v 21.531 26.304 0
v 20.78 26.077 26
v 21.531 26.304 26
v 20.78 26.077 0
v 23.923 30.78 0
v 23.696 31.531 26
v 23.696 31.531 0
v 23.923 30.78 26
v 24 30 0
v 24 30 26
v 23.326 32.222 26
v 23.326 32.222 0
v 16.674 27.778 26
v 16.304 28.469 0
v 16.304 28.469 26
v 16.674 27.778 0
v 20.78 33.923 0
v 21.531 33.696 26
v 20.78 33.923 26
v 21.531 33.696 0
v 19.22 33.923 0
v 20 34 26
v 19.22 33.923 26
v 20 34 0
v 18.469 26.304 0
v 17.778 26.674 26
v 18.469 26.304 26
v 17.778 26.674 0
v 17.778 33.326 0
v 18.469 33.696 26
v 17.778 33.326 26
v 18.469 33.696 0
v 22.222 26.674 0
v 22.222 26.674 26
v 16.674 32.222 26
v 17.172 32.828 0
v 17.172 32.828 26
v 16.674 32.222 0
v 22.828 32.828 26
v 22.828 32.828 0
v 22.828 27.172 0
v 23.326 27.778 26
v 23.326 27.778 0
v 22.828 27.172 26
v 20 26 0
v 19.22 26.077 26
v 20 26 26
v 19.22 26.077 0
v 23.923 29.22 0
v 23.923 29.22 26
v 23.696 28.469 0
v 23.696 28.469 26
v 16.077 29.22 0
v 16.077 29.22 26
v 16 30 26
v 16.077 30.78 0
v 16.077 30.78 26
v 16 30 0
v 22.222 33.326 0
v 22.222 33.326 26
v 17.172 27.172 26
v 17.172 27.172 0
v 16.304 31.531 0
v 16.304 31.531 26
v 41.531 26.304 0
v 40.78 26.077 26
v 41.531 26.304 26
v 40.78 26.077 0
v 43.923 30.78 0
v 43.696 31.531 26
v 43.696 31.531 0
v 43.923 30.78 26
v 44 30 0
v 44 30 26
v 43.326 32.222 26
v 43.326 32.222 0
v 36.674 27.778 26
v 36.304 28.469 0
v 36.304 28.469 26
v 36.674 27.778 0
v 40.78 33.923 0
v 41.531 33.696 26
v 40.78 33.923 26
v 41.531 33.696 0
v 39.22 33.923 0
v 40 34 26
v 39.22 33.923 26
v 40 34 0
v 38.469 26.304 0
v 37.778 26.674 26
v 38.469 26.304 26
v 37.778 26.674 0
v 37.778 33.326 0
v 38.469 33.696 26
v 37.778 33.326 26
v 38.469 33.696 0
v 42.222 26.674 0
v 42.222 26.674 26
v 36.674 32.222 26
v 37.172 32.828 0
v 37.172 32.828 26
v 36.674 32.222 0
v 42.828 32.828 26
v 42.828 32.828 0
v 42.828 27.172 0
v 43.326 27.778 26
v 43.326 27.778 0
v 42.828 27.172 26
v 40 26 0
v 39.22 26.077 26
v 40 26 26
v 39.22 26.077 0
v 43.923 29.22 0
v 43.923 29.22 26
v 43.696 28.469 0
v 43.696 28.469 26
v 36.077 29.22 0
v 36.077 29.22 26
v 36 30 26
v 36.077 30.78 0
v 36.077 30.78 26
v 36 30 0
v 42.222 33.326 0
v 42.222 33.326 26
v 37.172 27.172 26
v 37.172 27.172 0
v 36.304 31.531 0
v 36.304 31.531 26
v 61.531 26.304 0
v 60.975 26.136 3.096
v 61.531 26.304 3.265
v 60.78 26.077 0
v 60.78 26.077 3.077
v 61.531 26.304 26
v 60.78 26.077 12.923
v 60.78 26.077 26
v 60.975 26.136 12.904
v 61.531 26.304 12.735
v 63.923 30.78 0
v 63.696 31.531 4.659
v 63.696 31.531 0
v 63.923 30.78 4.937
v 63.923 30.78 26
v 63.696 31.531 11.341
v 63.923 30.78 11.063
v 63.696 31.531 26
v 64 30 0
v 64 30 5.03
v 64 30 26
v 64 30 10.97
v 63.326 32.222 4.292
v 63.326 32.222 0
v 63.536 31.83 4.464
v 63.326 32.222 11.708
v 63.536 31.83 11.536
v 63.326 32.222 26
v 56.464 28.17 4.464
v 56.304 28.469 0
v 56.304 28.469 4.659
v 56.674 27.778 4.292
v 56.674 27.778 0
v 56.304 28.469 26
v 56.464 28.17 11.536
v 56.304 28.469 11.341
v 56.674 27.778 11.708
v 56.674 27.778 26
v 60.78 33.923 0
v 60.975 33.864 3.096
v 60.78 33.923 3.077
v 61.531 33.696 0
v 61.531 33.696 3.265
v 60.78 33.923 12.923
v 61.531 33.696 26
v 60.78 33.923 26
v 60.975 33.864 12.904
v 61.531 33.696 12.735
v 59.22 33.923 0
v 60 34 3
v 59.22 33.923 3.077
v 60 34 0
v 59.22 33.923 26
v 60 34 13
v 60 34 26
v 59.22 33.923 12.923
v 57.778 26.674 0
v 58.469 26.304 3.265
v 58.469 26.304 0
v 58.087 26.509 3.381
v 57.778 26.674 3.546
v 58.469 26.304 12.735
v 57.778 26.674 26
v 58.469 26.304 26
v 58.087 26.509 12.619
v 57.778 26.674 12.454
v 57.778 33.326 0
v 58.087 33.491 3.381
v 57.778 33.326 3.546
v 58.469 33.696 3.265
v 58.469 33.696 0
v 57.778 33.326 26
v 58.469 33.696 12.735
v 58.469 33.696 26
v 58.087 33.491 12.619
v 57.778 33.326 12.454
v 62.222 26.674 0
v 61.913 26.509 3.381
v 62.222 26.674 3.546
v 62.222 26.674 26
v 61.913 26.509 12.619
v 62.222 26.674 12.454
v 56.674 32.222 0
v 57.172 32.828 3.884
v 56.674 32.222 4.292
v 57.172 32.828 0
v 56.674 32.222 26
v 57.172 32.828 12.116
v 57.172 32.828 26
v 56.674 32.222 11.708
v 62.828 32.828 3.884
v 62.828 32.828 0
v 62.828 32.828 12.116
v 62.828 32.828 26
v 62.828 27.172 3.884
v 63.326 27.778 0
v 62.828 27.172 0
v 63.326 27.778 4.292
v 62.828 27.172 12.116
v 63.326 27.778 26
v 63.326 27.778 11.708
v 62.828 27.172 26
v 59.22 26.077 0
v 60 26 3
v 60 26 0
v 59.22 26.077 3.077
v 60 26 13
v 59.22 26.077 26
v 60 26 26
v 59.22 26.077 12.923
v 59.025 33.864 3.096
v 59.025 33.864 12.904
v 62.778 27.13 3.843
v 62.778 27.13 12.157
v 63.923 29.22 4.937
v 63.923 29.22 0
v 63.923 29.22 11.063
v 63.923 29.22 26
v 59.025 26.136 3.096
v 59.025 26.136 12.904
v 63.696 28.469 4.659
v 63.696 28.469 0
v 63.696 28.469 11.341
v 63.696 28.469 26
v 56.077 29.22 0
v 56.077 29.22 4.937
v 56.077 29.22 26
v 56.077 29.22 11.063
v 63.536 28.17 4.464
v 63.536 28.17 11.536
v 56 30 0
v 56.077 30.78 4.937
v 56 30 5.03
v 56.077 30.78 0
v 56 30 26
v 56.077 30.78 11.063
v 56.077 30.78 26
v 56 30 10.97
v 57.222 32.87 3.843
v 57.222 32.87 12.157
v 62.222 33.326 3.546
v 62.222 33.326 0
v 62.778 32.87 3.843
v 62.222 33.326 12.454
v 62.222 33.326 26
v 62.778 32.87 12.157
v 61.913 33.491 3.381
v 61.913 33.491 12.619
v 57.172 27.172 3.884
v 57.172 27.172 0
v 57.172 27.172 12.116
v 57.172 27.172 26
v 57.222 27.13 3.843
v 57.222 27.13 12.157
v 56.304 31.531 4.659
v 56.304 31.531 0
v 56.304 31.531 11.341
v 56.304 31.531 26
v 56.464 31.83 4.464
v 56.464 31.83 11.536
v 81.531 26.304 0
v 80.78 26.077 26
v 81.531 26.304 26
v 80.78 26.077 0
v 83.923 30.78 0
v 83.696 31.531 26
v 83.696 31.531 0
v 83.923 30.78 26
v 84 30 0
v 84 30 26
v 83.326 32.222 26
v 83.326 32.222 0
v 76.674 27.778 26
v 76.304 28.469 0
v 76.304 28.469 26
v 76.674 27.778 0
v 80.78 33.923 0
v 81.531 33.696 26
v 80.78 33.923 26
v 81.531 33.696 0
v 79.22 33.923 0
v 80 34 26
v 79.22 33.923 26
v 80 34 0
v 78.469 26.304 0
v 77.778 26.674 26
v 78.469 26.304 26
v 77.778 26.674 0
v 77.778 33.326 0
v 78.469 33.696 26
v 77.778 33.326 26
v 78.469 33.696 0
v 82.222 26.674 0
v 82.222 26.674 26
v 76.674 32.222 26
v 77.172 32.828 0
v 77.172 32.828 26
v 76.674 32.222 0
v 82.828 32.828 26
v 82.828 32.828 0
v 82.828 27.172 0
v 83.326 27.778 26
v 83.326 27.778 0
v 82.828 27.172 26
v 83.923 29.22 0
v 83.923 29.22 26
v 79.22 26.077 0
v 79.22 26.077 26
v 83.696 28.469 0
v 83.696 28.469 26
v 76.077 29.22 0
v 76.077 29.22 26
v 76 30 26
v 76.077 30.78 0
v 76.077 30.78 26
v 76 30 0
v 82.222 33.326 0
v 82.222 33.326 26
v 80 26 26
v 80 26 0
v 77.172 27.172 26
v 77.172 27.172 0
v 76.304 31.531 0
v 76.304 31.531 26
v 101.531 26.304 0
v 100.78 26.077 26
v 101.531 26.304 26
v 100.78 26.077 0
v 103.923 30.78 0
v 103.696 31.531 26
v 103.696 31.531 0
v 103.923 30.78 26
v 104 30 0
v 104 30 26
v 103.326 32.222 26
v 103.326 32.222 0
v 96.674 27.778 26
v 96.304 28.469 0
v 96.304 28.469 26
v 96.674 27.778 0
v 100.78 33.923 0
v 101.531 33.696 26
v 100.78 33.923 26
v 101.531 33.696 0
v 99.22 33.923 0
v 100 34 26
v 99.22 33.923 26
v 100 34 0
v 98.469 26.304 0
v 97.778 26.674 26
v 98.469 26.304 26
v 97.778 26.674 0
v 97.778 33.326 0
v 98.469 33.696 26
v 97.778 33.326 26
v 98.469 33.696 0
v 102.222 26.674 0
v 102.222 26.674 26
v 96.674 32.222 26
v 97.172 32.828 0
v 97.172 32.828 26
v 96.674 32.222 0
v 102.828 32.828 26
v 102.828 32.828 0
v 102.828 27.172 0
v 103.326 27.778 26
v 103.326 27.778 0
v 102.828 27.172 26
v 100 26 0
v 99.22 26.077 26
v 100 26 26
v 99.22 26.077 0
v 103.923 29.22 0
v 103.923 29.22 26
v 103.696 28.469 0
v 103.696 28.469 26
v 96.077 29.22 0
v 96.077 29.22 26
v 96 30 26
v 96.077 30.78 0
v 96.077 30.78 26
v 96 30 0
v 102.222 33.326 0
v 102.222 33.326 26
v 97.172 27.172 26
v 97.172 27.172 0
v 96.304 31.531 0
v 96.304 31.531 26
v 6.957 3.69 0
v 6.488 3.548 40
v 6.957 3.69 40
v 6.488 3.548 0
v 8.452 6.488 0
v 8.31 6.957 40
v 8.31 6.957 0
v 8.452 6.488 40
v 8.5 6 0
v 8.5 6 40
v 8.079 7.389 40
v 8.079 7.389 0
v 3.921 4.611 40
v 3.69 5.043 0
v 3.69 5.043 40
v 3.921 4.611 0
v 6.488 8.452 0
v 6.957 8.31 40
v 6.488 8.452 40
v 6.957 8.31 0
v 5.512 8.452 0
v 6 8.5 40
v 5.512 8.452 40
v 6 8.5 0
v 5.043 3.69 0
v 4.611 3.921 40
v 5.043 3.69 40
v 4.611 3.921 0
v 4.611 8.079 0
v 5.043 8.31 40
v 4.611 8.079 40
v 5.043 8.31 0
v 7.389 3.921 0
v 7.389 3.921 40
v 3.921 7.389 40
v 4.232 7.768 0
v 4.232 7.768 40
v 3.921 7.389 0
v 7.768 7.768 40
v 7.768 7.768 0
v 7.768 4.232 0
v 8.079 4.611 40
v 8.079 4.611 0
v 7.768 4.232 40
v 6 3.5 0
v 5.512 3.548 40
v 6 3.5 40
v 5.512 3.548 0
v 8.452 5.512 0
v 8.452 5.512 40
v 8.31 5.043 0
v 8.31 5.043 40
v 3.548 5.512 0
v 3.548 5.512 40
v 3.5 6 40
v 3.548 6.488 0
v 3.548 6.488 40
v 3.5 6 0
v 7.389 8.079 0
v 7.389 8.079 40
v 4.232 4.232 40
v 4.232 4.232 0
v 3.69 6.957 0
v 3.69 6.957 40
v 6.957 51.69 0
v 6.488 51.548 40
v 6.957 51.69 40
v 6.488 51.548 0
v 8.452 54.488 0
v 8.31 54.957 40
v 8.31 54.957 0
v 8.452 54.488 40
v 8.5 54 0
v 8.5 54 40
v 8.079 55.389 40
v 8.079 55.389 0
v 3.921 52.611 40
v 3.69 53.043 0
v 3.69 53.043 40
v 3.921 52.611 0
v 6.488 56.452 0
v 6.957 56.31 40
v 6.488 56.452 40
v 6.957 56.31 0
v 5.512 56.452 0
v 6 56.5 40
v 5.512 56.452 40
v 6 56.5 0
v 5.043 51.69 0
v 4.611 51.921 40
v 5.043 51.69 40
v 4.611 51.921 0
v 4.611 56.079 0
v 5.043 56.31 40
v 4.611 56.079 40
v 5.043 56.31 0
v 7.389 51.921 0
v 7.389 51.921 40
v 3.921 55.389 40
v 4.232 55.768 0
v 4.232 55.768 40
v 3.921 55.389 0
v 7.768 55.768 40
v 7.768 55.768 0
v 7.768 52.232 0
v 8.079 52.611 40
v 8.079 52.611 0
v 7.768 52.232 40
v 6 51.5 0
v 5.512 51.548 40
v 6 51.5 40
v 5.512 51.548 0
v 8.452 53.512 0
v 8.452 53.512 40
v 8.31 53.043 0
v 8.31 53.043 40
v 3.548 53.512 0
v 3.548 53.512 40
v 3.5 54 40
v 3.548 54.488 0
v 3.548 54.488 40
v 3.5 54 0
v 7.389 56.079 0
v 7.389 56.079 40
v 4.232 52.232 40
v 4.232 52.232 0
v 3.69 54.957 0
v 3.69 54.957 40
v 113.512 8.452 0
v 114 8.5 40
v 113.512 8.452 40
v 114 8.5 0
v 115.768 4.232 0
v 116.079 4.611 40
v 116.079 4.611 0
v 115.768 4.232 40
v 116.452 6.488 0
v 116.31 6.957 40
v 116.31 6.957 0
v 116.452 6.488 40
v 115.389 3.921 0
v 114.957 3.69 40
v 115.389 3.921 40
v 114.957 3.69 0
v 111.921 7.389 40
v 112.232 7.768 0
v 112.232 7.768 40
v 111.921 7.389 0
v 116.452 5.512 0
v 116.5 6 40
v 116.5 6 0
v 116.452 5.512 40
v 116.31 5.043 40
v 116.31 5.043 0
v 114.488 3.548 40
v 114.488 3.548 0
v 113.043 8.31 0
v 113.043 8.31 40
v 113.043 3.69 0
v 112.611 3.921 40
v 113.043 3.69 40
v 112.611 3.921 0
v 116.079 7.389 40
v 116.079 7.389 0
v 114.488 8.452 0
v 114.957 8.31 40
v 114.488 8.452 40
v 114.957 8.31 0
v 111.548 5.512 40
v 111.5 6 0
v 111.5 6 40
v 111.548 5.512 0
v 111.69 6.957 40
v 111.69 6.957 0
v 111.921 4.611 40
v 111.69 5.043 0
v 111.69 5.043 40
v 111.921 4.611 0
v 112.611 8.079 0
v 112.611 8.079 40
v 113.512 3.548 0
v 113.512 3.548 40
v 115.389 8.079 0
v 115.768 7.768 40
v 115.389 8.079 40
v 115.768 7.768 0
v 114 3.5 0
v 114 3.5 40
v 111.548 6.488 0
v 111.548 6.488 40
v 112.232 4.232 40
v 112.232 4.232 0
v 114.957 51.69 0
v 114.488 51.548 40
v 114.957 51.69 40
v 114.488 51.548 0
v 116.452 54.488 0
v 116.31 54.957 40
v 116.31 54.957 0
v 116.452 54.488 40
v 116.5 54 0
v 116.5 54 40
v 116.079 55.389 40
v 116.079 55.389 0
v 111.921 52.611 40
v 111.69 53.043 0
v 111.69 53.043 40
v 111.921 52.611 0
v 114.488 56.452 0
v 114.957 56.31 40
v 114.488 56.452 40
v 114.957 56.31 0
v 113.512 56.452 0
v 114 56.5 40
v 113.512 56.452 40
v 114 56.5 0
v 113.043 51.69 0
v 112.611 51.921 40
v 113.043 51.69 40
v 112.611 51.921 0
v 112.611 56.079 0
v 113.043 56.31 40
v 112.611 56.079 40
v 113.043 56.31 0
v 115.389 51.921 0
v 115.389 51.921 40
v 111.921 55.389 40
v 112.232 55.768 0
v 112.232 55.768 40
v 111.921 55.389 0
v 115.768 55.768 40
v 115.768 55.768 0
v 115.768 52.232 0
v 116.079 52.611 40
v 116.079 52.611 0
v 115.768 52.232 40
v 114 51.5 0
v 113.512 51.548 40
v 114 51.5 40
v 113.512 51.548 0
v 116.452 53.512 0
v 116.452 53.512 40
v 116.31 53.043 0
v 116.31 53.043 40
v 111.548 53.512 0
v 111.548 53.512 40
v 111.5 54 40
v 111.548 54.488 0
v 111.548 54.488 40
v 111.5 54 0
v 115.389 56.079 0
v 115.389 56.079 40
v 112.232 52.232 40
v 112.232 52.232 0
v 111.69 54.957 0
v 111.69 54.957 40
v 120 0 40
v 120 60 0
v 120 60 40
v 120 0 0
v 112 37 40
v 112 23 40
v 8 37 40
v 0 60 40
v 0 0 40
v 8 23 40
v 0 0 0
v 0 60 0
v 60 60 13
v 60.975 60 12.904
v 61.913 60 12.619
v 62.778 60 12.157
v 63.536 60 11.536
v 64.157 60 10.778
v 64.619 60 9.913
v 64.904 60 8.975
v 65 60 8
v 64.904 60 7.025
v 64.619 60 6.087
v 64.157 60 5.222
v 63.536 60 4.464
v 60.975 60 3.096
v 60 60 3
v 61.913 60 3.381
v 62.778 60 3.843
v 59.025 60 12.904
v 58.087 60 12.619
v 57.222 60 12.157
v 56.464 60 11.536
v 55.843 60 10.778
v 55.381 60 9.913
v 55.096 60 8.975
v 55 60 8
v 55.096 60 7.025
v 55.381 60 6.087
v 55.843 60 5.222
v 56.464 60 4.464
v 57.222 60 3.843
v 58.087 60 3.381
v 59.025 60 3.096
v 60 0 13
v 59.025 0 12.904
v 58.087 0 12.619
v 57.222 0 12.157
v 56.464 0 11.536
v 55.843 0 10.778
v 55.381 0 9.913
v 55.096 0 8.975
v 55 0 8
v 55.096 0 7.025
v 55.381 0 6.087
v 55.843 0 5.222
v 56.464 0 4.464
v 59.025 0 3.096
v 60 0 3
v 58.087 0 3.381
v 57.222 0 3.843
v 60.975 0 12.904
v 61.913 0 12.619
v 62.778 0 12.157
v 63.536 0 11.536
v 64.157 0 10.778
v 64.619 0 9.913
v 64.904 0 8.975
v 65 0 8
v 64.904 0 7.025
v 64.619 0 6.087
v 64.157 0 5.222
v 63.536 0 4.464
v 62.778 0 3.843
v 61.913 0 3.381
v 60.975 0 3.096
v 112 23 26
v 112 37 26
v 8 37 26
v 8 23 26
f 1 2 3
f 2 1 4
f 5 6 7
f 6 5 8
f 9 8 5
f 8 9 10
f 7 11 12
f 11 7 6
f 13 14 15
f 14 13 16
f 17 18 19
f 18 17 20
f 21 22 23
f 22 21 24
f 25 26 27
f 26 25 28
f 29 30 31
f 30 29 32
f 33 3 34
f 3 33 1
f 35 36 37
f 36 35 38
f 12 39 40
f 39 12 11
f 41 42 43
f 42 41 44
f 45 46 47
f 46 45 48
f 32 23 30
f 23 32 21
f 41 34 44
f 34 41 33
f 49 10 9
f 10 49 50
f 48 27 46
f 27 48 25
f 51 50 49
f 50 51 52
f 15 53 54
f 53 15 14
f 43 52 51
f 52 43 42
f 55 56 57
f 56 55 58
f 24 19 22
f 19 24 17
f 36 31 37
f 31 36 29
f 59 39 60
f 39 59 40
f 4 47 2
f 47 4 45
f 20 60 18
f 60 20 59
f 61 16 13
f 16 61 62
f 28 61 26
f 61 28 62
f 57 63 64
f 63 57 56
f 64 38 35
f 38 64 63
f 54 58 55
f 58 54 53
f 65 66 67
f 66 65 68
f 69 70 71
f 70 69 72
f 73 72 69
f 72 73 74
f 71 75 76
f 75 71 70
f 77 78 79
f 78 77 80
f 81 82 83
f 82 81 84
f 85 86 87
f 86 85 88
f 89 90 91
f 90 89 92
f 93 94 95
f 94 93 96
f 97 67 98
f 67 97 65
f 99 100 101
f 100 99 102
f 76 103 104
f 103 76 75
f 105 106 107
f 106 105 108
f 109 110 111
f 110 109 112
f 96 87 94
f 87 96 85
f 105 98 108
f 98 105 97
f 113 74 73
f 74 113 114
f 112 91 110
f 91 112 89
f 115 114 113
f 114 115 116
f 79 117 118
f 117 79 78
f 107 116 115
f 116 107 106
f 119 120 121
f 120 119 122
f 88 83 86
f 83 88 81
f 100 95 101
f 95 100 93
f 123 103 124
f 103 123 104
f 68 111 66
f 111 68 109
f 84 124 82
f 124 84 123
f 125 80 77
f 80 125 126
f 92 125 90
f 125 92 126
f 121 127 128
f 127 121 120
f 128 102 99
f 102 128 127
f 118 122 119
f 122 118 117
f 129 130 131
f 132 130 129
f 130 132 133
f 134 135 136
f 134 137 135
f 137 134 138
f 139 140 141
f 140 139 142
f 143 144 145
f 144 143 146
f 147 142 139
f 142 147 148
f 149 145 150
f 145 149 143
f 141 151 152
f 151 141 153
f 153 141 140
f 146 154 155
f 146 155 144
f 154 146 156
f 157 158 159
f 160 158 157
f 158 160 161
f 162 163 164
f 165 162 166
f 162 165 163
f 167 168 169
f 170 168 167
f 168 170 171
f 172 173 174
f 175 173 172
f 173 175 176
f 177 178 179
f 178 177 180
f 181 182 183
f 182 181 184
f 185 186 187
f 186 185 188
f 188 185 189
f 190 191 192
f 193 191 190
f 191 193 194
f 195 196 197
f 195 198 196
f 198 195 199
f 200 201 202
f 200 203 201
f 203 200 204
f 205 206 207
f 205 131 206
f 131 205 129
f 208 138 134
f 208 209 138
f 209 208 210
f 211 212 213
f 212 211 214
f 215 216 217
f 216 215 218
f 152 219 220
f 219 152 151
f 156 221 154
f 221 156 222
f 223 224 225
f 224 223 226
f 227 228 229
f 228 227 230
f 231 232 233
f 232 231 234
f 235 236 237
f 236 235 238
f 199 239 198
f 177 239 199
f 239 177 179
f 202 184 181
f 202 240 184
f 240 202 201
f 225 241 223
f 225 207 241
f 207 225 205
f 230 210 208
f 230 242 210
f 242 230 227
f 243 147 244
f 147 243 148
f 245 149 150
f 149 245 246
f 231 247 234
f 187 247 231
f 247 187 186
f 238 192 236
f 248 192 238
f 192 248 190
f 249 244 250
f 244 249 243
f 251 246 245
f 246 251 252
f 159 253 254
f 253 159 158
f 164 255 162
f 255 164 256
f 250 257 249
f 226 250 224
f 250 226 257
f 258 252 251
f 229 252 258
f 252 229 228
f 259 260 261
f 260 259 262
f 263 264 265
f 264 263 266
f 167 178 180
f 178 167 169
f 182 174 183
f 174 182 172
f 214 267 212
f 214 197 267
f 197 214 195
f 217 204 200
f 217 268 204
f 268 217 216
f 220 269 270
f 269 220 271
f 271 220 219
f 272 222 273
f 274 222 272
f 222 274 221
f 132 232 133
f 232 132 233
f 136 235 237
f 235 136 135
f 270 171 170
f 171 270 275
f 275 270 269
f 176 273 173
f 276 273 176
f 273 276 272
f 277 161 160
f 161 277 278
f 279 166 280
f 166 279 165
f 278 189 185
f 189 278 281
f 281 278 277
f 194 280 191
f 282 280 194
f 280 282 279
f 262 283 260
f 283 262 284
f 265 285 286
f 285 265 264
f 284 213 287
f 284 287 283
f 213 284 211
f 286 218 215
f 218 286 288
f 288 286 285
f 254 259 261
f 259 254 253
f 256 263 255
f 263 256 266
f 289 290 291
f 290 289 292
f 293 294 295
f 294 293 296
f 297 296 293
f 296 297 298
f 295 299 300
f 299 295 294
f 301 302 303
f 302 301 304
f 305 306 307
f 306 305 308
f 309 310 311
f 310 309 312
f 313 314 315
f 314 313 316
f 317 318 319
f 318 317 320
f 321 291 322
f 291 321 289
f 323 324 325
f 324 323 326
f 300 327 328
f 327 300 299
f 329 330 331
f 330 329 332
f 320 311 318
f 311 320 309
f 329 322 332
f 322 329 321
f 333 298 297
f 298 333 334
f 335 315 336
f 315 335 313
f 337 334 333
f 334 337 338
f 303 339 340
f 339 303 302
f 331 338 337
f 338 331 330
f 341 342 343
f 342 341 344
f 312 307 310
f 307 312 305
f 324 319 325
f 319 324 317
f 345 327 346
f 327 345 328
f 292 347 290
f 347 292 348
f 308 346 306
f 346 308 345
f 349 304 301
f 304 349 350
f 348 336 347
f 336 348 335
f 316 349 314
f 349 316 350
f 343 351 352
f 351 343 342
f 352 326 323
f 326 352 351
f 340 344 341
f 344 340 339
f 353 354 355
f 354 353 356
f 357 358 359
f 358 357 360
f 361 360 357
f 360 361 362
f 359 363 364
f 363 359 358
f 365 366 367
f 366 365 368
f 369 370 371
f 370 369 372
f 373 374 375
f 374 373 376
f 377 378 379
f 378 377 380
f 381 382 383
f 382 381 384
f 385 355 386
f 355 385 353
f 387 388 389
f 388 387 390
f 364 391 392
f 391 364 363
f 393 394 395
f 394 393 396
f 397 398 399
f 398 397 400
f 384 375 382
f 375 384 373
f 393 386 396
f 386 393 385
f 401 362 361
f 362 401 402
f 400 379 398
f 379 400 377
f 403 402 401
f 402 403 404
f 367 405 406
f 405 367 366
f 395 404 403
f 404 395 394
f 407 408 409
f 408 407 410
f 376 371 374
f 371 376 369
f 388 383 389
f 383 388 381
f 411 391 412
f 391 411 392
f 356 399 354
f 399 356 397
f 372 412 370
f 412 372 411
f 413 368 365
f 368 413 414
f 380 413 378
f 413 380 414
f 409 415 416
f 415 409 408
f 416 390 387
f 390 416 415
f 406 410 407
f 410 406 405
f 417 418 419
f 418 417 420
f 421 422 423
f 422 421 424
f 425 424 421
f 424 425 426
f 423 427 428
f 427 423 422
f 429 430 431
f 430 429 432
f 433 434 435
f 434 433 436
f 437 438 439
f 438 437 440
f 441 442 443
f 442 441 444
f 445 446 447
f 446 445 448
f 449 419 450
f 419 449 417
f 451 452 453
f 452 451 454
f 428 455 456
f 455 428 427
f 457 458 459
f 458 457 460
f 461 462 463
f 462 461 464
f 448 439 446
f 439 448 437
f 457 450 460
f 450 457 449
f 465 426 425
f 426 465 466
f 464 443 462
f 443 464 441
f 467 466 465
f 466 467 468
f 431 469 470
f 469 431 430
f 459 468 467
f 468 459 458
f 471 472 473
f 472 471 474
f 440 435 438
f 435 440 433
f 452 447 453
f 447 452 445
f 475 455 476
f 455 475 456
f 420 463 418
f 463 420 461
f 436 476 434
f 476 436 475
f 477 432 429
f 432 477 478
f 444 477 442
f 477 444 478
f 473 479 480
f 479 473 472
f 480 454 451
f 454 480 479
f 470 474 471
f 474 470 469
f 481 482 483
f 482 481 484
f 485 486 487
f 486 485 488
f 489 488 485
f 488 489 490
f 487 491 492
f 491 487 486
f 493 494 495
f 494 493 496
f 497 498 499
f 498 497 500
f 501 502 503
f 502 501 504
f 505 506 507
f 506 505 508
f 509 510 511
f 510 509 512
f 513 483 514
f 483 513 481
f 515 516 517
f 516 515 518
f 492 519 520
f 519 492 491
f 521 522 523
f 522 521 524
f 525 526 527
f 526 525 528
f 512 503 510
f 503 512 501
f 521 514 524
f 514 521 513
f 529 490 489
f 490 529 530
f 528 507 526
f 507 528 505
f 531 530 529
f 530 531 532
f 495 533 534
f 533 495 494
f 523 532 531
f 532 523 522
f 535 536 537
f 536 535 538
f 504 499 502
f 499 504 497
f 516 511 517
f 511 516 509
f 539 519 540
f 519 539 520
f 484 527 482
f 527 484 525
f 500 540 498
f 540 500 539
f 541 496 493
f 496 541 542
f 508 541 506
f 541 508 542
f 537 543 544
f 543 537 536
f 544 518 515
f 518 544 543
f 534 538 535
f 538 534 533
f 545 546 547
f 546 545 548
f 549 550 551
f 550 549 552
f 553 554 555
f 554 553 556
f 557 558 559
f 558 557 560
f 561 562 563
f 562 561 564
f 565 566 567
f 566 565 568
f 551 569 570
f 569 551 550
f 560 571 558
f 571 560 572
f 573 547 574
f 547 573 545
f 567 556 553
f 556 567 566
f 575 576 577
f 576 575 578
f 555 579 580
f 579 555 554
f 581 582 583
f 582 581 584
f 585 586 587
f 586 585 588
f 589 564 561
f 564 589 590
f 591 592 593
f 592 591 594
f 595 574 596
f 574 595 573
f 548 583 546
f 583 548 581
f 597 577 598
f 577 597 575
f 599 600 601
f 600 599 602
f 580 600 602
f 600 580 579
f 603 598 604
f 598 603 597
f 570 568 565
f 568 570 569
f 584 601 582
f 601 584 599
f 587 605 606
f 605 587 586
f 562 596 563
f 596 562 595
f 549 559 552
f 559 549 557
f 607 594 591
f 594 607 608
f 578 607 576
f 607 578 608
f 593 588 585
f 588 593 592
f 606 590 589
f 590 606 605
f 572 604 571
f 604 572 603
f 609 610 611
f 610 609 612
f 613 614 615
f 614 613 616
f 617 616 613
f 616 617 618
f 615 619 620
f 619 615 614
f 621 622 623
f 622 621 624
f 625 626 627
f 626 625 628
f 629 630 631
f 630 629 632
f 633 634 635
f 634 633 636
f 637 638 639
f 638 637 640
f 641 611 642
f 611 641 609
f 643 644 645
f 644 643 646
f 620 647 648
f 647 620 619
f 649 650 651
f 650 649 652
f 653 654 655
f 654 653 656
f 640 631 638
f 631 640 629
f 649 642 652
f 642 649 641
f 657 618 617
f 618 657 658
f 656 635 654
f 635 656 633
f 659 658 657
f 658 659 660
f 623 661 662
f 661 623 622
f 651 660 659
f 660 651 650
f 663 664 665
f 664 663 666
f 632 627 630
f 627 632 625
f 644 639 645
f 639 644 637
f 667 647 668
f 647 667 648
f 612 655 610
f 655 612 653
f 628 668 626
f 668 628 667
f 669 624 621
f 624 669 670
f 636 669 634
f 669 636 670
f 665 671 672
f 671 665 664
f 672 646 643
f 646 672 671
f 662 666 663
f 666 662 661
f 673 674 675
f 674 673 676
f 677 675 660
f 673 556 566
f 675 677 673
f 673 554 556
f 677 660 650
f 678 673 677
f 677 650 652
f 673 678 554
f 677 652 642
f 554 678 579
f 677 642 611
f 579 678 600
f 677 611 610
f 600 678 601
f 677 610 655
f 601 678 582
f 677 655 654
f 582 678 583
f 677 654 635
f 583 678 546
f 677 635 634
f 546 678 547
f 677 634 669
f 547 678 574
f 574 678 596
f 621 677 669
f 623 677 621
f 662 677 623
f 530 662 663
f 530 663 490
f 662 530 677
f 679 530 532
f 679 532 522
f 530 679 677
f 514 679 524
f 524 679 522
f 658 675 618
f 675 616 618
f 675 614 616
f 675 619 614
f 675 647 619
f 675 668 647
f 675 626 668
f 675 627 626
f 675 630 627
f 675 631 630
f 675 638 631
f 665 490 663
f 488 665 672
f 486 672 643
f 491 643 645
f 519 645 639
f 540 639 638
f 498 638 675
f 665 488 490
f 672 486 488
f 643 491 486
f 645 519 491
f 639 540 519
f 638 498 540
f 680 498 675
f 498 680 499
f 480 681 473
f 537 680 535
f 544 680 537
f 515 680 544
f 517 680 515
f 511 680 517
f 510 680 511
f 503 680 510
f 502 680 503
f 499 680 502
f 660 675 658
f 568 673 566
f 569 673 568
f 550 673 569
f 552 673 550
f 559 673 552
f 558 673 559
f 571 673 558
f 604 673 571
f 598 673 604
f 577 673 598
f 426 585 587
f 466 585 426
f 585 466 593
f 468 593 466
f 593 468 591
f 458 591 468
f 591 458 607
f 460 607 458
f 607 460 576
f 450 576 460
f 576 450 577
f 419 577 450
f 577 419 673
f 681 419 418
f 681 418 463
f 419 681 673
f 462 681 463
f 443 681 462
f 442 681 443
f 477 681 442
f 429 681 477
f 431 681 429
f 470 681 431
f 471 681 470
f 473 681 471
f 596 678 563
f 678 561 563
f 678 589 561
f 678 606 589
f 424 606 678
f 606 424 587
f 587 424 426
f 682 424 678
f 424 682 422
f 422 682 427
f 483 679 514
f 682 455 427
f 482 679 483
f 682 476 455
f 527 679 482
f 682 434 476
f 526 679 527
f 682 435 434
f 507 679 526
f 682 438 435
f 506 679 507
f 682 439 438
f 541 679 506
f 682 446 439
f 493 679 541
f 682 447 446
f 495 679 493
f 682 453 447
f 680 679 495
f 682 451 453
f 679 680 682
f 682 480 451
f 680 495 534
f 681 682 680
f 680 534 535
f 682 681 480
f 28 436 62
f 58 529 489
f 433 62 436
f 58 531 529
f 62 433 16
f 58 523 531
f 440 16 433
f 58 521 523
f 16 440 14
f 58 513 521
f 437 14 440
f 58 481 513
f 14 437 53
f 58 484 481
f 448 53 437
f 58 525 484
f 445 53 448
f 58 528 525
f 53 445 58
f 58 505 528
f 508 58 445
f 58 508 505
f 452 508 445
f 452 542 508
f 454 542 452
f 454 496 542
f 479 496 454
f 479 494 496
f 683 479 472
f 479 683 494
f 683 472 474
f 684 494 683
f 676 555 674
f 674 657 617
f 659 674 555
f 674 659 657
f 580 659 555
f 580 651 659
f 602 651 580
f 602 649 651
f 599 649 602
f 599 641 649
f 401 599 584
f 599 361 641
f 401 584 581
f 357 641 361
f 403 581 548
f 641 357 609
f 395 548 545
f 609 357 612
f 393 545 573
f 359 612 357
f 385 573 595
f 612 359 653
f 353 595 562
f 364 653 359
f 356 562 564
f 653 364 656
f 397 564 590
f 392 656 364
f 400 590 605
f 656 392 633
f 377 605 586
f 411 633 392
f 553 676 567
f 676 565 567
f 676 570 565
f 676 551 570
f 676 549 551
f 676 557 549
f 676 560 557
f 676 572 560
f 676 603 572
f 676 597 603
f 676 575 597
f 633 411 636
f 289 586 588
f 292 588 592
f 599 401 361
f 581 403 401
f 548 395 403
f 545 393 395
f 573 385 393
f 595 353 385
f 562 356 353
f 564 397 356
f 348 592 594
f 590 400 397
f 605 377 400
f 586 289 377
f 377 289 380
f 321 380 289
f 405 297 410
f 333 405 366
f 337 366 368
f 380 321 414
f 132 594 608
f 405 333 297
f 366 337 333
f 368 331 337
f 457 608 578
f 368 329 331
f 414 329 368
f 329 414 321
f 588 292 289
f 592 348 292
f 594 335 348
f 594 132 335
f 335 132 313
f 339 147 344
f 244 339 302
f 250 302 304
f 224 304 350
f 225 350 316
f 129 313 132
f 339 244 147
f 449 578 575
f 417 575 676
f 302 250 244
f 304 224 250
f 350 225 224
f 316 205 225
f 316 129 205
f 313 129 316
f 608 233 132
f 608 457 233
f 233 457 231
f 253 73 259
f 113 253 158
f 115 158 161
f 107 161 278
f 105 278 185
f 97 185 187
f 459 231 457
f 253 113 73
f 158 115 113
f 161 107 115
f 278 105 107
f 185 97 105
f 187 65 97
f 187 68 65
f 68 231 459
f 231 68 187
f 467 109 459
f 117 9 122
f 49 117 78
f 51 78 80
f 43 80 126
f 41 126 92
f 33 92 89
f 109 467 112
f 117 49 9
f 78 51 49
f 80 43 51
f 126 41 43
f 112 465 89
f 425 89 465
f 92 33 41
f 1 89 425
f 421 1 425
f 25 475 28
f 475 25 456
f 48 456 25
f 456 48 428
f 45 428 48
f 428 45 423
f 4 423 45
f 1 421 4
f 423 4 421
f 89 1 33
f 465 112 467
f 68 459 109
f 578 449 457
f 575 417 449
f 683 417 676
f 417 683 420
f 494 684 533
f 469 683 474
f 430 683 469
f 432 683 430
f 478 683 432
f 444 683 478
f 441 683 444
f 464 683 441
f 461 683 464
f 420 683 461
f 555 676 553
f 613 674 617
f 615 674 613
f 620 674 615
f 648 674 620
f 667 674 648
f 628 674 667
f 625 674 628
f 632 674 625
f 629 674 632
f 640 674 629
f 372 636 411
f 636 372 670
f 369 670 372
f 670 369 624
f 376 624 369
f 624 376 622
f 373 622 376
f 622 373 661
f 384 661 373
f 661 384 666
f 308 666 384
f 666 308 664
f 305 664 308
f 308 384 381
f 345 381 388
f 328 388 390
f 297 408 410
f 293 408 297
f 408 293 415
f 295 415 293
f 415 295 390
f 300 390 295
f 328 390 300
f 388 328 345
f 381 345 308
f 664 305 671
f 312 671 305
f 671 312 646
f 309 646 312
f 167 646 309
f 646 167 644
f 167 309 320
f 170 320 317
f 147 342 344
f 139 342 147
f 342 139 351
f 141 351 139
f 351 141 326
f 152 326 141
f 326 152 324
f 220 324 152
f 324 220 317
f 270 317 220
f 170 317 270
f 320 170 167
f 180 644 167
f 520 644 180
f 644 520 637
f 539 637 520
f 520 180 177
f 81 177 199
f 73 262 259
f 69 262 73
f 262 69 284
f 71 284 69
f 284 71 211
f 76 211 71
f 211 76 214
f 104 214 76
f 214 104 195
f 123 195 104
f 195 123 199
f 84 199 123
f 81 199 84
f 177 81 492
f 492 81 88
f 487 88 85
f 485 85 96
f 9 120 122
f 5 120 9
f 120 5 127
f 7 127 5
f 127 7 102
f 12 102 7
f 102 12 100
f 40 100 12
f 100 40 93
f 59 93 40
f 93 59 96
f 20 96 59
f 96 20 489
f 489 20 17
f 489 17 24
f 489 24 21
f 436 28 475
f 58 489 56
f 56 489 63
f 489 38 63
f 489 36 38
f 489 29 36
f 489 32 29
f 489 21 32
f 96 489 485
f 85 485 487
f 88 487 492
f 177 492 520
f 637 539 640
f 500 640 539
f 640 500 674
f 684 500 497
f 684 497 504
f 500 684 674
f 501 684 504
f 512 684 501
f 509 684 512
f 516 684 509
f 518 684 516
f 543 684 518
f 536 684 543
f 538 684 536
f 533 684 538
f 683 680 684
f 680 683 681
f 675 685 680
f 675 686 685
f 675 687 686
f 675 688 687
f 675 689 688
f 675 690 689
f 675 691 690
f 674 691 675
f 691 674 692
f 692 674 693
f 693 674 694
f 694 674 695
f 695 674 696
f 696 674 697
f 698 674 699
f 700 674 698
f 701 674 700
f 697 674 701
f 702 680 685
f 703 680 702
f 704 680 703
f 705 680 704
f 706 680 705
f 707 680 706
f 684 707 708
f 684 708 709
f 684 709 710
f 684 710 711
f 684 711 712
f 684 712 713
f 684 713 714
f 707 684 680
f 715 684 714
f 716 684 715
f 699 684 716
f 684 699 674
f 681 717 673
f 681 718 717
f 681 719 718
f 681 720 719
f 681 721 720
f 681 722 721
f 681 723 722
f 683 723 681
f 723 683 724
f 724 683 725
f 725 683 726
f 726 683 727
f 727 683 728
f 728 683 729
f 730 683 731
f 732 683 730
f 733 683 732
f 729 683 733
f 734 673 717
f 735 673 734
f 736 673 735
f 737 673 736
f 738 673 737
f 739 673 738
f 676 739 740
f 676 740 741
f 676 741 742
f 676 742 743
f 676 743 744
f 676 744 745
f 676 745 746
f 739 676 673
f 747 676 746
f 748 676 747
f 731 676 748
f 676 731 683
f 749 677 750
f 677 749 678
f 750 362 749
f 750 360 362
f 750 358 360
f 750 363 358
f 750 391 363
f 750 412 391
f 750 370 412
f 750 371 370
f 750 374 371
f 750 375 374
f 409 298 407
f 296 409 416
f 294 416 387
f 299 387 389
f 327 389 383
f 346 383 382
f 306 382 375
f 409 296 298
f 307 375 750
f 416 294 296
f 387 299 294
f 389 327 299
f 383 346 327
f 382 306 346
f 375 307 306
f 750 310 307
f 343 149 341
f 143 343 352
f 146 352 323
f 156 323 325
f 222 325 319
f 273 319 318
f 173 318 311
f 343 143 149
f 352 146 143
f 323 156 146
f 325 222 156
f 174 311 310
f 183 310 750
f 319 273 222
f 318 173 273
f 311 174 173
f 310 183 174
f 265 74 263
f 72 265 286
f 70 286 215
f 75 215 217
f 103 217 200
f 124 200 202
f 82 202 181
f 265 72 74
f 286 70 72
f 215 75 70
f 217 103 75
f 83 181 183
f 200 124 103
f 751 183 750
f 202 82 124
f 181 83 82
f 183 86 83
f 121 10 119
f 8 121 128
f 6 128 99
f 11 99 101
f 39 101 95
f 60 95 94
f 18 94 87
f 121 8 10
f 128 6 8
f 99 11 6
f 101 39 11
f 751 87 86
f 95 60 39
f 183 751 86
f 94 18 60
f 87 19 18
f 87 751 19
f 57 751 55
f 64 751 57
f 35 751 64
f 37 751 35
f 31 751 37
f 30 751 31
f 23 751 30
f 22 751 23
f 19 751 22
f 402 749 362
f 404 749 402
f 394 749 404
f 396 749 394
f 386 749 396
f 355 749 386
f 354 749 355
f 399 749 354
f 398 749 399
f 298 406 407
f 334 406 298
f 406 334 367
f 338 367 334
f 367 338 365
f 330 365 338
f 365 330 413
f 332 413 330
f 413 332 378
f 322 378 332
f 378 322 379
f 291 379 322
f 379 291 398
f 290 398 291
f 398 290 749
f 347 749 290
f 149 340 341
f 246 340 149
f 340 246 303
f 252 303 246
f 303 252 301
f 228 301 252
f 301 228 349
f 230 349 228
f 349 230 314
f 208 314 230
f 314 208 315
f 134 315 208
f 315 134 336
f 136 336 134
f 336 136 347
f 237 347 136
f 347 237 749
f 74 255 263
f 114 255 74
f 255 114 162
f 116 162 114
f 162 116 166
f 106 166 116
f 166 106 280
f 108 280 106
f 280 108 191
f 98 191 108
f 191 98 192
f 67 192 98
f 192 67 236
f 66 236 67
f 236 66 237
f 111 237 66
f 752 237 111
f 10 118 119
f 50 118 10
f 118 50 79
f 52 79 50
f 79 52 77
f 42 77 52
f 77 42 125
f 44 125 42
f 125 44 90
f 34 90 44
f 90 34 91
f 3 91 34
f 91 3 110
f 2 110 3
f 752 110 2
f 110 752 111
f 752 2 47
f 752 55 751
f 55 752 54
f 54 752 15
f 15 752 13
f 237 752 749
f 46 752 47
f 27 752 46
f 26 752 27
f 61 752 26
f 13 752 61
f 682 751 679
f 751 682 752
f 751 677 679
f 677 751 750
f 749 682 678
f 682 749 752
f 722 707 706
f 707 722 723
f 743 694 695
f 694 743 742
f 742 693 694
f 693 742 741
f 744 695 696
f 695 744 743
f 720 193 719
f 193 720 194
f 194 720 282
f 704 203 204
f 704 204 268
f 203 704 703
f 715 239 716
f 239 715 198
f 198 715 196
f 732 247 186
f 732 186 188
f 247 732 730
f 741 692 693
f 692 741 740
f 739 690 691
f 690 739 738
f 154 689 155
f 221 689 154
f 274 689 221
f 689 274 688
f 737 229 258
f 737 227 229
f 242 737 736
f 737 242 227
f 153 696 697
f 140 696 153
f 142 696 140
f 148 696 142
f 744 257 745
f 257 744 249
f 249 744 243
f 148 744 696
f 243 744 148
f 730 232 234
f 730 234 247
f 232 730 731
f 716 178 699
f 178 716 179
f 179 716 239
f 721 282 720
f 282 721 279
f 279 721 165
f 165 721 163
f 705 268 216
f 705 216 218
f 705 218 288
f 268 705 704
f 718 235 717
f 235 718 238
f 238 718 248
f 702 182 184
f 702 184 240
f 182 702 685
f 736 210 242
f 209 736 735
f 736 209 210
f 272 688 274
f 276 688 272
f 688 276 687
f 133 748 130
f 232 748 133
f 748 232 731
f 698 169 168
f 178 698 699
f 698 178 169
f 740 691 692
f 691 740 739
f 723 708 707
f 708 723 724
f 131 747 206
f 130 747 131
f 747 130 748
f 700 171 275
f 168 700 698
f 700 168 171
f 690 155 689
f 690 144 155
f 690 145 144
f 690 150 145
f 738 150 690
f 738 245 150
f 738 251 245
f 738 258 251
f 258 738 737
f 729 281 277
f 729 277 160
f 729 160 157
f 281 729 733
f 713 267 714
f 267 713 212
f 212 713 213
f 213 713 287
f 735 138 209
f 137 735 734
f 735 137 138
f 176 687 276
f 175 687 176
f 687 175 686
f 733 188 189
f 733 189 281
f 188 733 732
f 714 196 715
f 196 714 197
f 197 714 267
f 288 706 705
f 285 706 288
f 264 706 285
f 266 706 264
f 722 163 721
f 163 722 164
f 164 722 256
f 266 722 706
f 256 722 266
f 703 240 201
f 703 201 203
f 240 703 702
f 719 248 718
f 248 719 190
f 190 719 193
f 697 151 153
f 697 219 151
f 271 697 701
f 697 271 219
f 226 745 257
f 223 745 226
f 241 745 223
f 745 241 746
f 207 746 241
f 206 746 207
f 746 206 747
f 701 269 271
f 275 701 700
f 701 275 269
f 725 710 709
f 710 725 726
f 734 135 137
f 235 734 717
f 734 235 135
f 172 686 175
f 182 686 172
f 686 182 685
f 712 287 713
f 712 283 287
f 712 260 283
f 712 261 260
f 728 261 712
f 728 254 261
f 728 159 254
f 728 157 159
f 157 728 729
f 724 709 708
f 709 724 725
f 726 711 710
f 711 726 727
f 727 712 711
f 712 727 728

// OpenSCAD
$fn = 32;

// ----------------------------------------------------------------------
// Manifold block: side_outlet manifold
// ----------------------------------------------------------------------

// --- parameters (mm) ---
block_l = 120;            // block length, X
block_w = 60;             // block width, Y
block_h = 40;             // block height, Z
port_d = 8;               // port bore diameter
port_pitch = 20;          // port pitch along X
gallery_d = 14;           // top gallery width, Y
gallery_depth = 14;       // gallery pocket depth
wall_p = 8;               // gallery end wall thickness, X
mnt_d = 5;                // mounting hole diameter
mnt_in = 6;               // mounting hole inset from the edges
out_d = 10;               // outlet bore diameter
out_z = 8;                // outlet axis height

n_ports = 5;  // ports in the row
port_x0 = (block_l - (n_ports - 1) * port_pitch) / 2;  // first port X

difference() {
  cube([block_l, block_w, block_h]);
  for (i = [0 : n_ports - 1])
    translate([port_x0 + i * port_pitch, block_w / 2, -1])
      cylinder(h = block_h + 2, d = port_d);
  translate([wall_p, block_w / 2 - gallery_d / 2, block_h - gallery_depth])
    cube([block_l - 2 * wall_p, gallery_d, gallery_depth + 1]);
  for (cx = [mnt_in, block_l - mnt_in])
    for (cy = [mnt_in, block_w - mnt_in])
      translate([cx, cy, -1]) cylinder(h = block_h + 2, d = mnt_d);
  translate([block_l / 2, -1, out_z]) rotate([-90, 0, 0])
    cylinder(h = block_w + 2, d = out_d);
}
